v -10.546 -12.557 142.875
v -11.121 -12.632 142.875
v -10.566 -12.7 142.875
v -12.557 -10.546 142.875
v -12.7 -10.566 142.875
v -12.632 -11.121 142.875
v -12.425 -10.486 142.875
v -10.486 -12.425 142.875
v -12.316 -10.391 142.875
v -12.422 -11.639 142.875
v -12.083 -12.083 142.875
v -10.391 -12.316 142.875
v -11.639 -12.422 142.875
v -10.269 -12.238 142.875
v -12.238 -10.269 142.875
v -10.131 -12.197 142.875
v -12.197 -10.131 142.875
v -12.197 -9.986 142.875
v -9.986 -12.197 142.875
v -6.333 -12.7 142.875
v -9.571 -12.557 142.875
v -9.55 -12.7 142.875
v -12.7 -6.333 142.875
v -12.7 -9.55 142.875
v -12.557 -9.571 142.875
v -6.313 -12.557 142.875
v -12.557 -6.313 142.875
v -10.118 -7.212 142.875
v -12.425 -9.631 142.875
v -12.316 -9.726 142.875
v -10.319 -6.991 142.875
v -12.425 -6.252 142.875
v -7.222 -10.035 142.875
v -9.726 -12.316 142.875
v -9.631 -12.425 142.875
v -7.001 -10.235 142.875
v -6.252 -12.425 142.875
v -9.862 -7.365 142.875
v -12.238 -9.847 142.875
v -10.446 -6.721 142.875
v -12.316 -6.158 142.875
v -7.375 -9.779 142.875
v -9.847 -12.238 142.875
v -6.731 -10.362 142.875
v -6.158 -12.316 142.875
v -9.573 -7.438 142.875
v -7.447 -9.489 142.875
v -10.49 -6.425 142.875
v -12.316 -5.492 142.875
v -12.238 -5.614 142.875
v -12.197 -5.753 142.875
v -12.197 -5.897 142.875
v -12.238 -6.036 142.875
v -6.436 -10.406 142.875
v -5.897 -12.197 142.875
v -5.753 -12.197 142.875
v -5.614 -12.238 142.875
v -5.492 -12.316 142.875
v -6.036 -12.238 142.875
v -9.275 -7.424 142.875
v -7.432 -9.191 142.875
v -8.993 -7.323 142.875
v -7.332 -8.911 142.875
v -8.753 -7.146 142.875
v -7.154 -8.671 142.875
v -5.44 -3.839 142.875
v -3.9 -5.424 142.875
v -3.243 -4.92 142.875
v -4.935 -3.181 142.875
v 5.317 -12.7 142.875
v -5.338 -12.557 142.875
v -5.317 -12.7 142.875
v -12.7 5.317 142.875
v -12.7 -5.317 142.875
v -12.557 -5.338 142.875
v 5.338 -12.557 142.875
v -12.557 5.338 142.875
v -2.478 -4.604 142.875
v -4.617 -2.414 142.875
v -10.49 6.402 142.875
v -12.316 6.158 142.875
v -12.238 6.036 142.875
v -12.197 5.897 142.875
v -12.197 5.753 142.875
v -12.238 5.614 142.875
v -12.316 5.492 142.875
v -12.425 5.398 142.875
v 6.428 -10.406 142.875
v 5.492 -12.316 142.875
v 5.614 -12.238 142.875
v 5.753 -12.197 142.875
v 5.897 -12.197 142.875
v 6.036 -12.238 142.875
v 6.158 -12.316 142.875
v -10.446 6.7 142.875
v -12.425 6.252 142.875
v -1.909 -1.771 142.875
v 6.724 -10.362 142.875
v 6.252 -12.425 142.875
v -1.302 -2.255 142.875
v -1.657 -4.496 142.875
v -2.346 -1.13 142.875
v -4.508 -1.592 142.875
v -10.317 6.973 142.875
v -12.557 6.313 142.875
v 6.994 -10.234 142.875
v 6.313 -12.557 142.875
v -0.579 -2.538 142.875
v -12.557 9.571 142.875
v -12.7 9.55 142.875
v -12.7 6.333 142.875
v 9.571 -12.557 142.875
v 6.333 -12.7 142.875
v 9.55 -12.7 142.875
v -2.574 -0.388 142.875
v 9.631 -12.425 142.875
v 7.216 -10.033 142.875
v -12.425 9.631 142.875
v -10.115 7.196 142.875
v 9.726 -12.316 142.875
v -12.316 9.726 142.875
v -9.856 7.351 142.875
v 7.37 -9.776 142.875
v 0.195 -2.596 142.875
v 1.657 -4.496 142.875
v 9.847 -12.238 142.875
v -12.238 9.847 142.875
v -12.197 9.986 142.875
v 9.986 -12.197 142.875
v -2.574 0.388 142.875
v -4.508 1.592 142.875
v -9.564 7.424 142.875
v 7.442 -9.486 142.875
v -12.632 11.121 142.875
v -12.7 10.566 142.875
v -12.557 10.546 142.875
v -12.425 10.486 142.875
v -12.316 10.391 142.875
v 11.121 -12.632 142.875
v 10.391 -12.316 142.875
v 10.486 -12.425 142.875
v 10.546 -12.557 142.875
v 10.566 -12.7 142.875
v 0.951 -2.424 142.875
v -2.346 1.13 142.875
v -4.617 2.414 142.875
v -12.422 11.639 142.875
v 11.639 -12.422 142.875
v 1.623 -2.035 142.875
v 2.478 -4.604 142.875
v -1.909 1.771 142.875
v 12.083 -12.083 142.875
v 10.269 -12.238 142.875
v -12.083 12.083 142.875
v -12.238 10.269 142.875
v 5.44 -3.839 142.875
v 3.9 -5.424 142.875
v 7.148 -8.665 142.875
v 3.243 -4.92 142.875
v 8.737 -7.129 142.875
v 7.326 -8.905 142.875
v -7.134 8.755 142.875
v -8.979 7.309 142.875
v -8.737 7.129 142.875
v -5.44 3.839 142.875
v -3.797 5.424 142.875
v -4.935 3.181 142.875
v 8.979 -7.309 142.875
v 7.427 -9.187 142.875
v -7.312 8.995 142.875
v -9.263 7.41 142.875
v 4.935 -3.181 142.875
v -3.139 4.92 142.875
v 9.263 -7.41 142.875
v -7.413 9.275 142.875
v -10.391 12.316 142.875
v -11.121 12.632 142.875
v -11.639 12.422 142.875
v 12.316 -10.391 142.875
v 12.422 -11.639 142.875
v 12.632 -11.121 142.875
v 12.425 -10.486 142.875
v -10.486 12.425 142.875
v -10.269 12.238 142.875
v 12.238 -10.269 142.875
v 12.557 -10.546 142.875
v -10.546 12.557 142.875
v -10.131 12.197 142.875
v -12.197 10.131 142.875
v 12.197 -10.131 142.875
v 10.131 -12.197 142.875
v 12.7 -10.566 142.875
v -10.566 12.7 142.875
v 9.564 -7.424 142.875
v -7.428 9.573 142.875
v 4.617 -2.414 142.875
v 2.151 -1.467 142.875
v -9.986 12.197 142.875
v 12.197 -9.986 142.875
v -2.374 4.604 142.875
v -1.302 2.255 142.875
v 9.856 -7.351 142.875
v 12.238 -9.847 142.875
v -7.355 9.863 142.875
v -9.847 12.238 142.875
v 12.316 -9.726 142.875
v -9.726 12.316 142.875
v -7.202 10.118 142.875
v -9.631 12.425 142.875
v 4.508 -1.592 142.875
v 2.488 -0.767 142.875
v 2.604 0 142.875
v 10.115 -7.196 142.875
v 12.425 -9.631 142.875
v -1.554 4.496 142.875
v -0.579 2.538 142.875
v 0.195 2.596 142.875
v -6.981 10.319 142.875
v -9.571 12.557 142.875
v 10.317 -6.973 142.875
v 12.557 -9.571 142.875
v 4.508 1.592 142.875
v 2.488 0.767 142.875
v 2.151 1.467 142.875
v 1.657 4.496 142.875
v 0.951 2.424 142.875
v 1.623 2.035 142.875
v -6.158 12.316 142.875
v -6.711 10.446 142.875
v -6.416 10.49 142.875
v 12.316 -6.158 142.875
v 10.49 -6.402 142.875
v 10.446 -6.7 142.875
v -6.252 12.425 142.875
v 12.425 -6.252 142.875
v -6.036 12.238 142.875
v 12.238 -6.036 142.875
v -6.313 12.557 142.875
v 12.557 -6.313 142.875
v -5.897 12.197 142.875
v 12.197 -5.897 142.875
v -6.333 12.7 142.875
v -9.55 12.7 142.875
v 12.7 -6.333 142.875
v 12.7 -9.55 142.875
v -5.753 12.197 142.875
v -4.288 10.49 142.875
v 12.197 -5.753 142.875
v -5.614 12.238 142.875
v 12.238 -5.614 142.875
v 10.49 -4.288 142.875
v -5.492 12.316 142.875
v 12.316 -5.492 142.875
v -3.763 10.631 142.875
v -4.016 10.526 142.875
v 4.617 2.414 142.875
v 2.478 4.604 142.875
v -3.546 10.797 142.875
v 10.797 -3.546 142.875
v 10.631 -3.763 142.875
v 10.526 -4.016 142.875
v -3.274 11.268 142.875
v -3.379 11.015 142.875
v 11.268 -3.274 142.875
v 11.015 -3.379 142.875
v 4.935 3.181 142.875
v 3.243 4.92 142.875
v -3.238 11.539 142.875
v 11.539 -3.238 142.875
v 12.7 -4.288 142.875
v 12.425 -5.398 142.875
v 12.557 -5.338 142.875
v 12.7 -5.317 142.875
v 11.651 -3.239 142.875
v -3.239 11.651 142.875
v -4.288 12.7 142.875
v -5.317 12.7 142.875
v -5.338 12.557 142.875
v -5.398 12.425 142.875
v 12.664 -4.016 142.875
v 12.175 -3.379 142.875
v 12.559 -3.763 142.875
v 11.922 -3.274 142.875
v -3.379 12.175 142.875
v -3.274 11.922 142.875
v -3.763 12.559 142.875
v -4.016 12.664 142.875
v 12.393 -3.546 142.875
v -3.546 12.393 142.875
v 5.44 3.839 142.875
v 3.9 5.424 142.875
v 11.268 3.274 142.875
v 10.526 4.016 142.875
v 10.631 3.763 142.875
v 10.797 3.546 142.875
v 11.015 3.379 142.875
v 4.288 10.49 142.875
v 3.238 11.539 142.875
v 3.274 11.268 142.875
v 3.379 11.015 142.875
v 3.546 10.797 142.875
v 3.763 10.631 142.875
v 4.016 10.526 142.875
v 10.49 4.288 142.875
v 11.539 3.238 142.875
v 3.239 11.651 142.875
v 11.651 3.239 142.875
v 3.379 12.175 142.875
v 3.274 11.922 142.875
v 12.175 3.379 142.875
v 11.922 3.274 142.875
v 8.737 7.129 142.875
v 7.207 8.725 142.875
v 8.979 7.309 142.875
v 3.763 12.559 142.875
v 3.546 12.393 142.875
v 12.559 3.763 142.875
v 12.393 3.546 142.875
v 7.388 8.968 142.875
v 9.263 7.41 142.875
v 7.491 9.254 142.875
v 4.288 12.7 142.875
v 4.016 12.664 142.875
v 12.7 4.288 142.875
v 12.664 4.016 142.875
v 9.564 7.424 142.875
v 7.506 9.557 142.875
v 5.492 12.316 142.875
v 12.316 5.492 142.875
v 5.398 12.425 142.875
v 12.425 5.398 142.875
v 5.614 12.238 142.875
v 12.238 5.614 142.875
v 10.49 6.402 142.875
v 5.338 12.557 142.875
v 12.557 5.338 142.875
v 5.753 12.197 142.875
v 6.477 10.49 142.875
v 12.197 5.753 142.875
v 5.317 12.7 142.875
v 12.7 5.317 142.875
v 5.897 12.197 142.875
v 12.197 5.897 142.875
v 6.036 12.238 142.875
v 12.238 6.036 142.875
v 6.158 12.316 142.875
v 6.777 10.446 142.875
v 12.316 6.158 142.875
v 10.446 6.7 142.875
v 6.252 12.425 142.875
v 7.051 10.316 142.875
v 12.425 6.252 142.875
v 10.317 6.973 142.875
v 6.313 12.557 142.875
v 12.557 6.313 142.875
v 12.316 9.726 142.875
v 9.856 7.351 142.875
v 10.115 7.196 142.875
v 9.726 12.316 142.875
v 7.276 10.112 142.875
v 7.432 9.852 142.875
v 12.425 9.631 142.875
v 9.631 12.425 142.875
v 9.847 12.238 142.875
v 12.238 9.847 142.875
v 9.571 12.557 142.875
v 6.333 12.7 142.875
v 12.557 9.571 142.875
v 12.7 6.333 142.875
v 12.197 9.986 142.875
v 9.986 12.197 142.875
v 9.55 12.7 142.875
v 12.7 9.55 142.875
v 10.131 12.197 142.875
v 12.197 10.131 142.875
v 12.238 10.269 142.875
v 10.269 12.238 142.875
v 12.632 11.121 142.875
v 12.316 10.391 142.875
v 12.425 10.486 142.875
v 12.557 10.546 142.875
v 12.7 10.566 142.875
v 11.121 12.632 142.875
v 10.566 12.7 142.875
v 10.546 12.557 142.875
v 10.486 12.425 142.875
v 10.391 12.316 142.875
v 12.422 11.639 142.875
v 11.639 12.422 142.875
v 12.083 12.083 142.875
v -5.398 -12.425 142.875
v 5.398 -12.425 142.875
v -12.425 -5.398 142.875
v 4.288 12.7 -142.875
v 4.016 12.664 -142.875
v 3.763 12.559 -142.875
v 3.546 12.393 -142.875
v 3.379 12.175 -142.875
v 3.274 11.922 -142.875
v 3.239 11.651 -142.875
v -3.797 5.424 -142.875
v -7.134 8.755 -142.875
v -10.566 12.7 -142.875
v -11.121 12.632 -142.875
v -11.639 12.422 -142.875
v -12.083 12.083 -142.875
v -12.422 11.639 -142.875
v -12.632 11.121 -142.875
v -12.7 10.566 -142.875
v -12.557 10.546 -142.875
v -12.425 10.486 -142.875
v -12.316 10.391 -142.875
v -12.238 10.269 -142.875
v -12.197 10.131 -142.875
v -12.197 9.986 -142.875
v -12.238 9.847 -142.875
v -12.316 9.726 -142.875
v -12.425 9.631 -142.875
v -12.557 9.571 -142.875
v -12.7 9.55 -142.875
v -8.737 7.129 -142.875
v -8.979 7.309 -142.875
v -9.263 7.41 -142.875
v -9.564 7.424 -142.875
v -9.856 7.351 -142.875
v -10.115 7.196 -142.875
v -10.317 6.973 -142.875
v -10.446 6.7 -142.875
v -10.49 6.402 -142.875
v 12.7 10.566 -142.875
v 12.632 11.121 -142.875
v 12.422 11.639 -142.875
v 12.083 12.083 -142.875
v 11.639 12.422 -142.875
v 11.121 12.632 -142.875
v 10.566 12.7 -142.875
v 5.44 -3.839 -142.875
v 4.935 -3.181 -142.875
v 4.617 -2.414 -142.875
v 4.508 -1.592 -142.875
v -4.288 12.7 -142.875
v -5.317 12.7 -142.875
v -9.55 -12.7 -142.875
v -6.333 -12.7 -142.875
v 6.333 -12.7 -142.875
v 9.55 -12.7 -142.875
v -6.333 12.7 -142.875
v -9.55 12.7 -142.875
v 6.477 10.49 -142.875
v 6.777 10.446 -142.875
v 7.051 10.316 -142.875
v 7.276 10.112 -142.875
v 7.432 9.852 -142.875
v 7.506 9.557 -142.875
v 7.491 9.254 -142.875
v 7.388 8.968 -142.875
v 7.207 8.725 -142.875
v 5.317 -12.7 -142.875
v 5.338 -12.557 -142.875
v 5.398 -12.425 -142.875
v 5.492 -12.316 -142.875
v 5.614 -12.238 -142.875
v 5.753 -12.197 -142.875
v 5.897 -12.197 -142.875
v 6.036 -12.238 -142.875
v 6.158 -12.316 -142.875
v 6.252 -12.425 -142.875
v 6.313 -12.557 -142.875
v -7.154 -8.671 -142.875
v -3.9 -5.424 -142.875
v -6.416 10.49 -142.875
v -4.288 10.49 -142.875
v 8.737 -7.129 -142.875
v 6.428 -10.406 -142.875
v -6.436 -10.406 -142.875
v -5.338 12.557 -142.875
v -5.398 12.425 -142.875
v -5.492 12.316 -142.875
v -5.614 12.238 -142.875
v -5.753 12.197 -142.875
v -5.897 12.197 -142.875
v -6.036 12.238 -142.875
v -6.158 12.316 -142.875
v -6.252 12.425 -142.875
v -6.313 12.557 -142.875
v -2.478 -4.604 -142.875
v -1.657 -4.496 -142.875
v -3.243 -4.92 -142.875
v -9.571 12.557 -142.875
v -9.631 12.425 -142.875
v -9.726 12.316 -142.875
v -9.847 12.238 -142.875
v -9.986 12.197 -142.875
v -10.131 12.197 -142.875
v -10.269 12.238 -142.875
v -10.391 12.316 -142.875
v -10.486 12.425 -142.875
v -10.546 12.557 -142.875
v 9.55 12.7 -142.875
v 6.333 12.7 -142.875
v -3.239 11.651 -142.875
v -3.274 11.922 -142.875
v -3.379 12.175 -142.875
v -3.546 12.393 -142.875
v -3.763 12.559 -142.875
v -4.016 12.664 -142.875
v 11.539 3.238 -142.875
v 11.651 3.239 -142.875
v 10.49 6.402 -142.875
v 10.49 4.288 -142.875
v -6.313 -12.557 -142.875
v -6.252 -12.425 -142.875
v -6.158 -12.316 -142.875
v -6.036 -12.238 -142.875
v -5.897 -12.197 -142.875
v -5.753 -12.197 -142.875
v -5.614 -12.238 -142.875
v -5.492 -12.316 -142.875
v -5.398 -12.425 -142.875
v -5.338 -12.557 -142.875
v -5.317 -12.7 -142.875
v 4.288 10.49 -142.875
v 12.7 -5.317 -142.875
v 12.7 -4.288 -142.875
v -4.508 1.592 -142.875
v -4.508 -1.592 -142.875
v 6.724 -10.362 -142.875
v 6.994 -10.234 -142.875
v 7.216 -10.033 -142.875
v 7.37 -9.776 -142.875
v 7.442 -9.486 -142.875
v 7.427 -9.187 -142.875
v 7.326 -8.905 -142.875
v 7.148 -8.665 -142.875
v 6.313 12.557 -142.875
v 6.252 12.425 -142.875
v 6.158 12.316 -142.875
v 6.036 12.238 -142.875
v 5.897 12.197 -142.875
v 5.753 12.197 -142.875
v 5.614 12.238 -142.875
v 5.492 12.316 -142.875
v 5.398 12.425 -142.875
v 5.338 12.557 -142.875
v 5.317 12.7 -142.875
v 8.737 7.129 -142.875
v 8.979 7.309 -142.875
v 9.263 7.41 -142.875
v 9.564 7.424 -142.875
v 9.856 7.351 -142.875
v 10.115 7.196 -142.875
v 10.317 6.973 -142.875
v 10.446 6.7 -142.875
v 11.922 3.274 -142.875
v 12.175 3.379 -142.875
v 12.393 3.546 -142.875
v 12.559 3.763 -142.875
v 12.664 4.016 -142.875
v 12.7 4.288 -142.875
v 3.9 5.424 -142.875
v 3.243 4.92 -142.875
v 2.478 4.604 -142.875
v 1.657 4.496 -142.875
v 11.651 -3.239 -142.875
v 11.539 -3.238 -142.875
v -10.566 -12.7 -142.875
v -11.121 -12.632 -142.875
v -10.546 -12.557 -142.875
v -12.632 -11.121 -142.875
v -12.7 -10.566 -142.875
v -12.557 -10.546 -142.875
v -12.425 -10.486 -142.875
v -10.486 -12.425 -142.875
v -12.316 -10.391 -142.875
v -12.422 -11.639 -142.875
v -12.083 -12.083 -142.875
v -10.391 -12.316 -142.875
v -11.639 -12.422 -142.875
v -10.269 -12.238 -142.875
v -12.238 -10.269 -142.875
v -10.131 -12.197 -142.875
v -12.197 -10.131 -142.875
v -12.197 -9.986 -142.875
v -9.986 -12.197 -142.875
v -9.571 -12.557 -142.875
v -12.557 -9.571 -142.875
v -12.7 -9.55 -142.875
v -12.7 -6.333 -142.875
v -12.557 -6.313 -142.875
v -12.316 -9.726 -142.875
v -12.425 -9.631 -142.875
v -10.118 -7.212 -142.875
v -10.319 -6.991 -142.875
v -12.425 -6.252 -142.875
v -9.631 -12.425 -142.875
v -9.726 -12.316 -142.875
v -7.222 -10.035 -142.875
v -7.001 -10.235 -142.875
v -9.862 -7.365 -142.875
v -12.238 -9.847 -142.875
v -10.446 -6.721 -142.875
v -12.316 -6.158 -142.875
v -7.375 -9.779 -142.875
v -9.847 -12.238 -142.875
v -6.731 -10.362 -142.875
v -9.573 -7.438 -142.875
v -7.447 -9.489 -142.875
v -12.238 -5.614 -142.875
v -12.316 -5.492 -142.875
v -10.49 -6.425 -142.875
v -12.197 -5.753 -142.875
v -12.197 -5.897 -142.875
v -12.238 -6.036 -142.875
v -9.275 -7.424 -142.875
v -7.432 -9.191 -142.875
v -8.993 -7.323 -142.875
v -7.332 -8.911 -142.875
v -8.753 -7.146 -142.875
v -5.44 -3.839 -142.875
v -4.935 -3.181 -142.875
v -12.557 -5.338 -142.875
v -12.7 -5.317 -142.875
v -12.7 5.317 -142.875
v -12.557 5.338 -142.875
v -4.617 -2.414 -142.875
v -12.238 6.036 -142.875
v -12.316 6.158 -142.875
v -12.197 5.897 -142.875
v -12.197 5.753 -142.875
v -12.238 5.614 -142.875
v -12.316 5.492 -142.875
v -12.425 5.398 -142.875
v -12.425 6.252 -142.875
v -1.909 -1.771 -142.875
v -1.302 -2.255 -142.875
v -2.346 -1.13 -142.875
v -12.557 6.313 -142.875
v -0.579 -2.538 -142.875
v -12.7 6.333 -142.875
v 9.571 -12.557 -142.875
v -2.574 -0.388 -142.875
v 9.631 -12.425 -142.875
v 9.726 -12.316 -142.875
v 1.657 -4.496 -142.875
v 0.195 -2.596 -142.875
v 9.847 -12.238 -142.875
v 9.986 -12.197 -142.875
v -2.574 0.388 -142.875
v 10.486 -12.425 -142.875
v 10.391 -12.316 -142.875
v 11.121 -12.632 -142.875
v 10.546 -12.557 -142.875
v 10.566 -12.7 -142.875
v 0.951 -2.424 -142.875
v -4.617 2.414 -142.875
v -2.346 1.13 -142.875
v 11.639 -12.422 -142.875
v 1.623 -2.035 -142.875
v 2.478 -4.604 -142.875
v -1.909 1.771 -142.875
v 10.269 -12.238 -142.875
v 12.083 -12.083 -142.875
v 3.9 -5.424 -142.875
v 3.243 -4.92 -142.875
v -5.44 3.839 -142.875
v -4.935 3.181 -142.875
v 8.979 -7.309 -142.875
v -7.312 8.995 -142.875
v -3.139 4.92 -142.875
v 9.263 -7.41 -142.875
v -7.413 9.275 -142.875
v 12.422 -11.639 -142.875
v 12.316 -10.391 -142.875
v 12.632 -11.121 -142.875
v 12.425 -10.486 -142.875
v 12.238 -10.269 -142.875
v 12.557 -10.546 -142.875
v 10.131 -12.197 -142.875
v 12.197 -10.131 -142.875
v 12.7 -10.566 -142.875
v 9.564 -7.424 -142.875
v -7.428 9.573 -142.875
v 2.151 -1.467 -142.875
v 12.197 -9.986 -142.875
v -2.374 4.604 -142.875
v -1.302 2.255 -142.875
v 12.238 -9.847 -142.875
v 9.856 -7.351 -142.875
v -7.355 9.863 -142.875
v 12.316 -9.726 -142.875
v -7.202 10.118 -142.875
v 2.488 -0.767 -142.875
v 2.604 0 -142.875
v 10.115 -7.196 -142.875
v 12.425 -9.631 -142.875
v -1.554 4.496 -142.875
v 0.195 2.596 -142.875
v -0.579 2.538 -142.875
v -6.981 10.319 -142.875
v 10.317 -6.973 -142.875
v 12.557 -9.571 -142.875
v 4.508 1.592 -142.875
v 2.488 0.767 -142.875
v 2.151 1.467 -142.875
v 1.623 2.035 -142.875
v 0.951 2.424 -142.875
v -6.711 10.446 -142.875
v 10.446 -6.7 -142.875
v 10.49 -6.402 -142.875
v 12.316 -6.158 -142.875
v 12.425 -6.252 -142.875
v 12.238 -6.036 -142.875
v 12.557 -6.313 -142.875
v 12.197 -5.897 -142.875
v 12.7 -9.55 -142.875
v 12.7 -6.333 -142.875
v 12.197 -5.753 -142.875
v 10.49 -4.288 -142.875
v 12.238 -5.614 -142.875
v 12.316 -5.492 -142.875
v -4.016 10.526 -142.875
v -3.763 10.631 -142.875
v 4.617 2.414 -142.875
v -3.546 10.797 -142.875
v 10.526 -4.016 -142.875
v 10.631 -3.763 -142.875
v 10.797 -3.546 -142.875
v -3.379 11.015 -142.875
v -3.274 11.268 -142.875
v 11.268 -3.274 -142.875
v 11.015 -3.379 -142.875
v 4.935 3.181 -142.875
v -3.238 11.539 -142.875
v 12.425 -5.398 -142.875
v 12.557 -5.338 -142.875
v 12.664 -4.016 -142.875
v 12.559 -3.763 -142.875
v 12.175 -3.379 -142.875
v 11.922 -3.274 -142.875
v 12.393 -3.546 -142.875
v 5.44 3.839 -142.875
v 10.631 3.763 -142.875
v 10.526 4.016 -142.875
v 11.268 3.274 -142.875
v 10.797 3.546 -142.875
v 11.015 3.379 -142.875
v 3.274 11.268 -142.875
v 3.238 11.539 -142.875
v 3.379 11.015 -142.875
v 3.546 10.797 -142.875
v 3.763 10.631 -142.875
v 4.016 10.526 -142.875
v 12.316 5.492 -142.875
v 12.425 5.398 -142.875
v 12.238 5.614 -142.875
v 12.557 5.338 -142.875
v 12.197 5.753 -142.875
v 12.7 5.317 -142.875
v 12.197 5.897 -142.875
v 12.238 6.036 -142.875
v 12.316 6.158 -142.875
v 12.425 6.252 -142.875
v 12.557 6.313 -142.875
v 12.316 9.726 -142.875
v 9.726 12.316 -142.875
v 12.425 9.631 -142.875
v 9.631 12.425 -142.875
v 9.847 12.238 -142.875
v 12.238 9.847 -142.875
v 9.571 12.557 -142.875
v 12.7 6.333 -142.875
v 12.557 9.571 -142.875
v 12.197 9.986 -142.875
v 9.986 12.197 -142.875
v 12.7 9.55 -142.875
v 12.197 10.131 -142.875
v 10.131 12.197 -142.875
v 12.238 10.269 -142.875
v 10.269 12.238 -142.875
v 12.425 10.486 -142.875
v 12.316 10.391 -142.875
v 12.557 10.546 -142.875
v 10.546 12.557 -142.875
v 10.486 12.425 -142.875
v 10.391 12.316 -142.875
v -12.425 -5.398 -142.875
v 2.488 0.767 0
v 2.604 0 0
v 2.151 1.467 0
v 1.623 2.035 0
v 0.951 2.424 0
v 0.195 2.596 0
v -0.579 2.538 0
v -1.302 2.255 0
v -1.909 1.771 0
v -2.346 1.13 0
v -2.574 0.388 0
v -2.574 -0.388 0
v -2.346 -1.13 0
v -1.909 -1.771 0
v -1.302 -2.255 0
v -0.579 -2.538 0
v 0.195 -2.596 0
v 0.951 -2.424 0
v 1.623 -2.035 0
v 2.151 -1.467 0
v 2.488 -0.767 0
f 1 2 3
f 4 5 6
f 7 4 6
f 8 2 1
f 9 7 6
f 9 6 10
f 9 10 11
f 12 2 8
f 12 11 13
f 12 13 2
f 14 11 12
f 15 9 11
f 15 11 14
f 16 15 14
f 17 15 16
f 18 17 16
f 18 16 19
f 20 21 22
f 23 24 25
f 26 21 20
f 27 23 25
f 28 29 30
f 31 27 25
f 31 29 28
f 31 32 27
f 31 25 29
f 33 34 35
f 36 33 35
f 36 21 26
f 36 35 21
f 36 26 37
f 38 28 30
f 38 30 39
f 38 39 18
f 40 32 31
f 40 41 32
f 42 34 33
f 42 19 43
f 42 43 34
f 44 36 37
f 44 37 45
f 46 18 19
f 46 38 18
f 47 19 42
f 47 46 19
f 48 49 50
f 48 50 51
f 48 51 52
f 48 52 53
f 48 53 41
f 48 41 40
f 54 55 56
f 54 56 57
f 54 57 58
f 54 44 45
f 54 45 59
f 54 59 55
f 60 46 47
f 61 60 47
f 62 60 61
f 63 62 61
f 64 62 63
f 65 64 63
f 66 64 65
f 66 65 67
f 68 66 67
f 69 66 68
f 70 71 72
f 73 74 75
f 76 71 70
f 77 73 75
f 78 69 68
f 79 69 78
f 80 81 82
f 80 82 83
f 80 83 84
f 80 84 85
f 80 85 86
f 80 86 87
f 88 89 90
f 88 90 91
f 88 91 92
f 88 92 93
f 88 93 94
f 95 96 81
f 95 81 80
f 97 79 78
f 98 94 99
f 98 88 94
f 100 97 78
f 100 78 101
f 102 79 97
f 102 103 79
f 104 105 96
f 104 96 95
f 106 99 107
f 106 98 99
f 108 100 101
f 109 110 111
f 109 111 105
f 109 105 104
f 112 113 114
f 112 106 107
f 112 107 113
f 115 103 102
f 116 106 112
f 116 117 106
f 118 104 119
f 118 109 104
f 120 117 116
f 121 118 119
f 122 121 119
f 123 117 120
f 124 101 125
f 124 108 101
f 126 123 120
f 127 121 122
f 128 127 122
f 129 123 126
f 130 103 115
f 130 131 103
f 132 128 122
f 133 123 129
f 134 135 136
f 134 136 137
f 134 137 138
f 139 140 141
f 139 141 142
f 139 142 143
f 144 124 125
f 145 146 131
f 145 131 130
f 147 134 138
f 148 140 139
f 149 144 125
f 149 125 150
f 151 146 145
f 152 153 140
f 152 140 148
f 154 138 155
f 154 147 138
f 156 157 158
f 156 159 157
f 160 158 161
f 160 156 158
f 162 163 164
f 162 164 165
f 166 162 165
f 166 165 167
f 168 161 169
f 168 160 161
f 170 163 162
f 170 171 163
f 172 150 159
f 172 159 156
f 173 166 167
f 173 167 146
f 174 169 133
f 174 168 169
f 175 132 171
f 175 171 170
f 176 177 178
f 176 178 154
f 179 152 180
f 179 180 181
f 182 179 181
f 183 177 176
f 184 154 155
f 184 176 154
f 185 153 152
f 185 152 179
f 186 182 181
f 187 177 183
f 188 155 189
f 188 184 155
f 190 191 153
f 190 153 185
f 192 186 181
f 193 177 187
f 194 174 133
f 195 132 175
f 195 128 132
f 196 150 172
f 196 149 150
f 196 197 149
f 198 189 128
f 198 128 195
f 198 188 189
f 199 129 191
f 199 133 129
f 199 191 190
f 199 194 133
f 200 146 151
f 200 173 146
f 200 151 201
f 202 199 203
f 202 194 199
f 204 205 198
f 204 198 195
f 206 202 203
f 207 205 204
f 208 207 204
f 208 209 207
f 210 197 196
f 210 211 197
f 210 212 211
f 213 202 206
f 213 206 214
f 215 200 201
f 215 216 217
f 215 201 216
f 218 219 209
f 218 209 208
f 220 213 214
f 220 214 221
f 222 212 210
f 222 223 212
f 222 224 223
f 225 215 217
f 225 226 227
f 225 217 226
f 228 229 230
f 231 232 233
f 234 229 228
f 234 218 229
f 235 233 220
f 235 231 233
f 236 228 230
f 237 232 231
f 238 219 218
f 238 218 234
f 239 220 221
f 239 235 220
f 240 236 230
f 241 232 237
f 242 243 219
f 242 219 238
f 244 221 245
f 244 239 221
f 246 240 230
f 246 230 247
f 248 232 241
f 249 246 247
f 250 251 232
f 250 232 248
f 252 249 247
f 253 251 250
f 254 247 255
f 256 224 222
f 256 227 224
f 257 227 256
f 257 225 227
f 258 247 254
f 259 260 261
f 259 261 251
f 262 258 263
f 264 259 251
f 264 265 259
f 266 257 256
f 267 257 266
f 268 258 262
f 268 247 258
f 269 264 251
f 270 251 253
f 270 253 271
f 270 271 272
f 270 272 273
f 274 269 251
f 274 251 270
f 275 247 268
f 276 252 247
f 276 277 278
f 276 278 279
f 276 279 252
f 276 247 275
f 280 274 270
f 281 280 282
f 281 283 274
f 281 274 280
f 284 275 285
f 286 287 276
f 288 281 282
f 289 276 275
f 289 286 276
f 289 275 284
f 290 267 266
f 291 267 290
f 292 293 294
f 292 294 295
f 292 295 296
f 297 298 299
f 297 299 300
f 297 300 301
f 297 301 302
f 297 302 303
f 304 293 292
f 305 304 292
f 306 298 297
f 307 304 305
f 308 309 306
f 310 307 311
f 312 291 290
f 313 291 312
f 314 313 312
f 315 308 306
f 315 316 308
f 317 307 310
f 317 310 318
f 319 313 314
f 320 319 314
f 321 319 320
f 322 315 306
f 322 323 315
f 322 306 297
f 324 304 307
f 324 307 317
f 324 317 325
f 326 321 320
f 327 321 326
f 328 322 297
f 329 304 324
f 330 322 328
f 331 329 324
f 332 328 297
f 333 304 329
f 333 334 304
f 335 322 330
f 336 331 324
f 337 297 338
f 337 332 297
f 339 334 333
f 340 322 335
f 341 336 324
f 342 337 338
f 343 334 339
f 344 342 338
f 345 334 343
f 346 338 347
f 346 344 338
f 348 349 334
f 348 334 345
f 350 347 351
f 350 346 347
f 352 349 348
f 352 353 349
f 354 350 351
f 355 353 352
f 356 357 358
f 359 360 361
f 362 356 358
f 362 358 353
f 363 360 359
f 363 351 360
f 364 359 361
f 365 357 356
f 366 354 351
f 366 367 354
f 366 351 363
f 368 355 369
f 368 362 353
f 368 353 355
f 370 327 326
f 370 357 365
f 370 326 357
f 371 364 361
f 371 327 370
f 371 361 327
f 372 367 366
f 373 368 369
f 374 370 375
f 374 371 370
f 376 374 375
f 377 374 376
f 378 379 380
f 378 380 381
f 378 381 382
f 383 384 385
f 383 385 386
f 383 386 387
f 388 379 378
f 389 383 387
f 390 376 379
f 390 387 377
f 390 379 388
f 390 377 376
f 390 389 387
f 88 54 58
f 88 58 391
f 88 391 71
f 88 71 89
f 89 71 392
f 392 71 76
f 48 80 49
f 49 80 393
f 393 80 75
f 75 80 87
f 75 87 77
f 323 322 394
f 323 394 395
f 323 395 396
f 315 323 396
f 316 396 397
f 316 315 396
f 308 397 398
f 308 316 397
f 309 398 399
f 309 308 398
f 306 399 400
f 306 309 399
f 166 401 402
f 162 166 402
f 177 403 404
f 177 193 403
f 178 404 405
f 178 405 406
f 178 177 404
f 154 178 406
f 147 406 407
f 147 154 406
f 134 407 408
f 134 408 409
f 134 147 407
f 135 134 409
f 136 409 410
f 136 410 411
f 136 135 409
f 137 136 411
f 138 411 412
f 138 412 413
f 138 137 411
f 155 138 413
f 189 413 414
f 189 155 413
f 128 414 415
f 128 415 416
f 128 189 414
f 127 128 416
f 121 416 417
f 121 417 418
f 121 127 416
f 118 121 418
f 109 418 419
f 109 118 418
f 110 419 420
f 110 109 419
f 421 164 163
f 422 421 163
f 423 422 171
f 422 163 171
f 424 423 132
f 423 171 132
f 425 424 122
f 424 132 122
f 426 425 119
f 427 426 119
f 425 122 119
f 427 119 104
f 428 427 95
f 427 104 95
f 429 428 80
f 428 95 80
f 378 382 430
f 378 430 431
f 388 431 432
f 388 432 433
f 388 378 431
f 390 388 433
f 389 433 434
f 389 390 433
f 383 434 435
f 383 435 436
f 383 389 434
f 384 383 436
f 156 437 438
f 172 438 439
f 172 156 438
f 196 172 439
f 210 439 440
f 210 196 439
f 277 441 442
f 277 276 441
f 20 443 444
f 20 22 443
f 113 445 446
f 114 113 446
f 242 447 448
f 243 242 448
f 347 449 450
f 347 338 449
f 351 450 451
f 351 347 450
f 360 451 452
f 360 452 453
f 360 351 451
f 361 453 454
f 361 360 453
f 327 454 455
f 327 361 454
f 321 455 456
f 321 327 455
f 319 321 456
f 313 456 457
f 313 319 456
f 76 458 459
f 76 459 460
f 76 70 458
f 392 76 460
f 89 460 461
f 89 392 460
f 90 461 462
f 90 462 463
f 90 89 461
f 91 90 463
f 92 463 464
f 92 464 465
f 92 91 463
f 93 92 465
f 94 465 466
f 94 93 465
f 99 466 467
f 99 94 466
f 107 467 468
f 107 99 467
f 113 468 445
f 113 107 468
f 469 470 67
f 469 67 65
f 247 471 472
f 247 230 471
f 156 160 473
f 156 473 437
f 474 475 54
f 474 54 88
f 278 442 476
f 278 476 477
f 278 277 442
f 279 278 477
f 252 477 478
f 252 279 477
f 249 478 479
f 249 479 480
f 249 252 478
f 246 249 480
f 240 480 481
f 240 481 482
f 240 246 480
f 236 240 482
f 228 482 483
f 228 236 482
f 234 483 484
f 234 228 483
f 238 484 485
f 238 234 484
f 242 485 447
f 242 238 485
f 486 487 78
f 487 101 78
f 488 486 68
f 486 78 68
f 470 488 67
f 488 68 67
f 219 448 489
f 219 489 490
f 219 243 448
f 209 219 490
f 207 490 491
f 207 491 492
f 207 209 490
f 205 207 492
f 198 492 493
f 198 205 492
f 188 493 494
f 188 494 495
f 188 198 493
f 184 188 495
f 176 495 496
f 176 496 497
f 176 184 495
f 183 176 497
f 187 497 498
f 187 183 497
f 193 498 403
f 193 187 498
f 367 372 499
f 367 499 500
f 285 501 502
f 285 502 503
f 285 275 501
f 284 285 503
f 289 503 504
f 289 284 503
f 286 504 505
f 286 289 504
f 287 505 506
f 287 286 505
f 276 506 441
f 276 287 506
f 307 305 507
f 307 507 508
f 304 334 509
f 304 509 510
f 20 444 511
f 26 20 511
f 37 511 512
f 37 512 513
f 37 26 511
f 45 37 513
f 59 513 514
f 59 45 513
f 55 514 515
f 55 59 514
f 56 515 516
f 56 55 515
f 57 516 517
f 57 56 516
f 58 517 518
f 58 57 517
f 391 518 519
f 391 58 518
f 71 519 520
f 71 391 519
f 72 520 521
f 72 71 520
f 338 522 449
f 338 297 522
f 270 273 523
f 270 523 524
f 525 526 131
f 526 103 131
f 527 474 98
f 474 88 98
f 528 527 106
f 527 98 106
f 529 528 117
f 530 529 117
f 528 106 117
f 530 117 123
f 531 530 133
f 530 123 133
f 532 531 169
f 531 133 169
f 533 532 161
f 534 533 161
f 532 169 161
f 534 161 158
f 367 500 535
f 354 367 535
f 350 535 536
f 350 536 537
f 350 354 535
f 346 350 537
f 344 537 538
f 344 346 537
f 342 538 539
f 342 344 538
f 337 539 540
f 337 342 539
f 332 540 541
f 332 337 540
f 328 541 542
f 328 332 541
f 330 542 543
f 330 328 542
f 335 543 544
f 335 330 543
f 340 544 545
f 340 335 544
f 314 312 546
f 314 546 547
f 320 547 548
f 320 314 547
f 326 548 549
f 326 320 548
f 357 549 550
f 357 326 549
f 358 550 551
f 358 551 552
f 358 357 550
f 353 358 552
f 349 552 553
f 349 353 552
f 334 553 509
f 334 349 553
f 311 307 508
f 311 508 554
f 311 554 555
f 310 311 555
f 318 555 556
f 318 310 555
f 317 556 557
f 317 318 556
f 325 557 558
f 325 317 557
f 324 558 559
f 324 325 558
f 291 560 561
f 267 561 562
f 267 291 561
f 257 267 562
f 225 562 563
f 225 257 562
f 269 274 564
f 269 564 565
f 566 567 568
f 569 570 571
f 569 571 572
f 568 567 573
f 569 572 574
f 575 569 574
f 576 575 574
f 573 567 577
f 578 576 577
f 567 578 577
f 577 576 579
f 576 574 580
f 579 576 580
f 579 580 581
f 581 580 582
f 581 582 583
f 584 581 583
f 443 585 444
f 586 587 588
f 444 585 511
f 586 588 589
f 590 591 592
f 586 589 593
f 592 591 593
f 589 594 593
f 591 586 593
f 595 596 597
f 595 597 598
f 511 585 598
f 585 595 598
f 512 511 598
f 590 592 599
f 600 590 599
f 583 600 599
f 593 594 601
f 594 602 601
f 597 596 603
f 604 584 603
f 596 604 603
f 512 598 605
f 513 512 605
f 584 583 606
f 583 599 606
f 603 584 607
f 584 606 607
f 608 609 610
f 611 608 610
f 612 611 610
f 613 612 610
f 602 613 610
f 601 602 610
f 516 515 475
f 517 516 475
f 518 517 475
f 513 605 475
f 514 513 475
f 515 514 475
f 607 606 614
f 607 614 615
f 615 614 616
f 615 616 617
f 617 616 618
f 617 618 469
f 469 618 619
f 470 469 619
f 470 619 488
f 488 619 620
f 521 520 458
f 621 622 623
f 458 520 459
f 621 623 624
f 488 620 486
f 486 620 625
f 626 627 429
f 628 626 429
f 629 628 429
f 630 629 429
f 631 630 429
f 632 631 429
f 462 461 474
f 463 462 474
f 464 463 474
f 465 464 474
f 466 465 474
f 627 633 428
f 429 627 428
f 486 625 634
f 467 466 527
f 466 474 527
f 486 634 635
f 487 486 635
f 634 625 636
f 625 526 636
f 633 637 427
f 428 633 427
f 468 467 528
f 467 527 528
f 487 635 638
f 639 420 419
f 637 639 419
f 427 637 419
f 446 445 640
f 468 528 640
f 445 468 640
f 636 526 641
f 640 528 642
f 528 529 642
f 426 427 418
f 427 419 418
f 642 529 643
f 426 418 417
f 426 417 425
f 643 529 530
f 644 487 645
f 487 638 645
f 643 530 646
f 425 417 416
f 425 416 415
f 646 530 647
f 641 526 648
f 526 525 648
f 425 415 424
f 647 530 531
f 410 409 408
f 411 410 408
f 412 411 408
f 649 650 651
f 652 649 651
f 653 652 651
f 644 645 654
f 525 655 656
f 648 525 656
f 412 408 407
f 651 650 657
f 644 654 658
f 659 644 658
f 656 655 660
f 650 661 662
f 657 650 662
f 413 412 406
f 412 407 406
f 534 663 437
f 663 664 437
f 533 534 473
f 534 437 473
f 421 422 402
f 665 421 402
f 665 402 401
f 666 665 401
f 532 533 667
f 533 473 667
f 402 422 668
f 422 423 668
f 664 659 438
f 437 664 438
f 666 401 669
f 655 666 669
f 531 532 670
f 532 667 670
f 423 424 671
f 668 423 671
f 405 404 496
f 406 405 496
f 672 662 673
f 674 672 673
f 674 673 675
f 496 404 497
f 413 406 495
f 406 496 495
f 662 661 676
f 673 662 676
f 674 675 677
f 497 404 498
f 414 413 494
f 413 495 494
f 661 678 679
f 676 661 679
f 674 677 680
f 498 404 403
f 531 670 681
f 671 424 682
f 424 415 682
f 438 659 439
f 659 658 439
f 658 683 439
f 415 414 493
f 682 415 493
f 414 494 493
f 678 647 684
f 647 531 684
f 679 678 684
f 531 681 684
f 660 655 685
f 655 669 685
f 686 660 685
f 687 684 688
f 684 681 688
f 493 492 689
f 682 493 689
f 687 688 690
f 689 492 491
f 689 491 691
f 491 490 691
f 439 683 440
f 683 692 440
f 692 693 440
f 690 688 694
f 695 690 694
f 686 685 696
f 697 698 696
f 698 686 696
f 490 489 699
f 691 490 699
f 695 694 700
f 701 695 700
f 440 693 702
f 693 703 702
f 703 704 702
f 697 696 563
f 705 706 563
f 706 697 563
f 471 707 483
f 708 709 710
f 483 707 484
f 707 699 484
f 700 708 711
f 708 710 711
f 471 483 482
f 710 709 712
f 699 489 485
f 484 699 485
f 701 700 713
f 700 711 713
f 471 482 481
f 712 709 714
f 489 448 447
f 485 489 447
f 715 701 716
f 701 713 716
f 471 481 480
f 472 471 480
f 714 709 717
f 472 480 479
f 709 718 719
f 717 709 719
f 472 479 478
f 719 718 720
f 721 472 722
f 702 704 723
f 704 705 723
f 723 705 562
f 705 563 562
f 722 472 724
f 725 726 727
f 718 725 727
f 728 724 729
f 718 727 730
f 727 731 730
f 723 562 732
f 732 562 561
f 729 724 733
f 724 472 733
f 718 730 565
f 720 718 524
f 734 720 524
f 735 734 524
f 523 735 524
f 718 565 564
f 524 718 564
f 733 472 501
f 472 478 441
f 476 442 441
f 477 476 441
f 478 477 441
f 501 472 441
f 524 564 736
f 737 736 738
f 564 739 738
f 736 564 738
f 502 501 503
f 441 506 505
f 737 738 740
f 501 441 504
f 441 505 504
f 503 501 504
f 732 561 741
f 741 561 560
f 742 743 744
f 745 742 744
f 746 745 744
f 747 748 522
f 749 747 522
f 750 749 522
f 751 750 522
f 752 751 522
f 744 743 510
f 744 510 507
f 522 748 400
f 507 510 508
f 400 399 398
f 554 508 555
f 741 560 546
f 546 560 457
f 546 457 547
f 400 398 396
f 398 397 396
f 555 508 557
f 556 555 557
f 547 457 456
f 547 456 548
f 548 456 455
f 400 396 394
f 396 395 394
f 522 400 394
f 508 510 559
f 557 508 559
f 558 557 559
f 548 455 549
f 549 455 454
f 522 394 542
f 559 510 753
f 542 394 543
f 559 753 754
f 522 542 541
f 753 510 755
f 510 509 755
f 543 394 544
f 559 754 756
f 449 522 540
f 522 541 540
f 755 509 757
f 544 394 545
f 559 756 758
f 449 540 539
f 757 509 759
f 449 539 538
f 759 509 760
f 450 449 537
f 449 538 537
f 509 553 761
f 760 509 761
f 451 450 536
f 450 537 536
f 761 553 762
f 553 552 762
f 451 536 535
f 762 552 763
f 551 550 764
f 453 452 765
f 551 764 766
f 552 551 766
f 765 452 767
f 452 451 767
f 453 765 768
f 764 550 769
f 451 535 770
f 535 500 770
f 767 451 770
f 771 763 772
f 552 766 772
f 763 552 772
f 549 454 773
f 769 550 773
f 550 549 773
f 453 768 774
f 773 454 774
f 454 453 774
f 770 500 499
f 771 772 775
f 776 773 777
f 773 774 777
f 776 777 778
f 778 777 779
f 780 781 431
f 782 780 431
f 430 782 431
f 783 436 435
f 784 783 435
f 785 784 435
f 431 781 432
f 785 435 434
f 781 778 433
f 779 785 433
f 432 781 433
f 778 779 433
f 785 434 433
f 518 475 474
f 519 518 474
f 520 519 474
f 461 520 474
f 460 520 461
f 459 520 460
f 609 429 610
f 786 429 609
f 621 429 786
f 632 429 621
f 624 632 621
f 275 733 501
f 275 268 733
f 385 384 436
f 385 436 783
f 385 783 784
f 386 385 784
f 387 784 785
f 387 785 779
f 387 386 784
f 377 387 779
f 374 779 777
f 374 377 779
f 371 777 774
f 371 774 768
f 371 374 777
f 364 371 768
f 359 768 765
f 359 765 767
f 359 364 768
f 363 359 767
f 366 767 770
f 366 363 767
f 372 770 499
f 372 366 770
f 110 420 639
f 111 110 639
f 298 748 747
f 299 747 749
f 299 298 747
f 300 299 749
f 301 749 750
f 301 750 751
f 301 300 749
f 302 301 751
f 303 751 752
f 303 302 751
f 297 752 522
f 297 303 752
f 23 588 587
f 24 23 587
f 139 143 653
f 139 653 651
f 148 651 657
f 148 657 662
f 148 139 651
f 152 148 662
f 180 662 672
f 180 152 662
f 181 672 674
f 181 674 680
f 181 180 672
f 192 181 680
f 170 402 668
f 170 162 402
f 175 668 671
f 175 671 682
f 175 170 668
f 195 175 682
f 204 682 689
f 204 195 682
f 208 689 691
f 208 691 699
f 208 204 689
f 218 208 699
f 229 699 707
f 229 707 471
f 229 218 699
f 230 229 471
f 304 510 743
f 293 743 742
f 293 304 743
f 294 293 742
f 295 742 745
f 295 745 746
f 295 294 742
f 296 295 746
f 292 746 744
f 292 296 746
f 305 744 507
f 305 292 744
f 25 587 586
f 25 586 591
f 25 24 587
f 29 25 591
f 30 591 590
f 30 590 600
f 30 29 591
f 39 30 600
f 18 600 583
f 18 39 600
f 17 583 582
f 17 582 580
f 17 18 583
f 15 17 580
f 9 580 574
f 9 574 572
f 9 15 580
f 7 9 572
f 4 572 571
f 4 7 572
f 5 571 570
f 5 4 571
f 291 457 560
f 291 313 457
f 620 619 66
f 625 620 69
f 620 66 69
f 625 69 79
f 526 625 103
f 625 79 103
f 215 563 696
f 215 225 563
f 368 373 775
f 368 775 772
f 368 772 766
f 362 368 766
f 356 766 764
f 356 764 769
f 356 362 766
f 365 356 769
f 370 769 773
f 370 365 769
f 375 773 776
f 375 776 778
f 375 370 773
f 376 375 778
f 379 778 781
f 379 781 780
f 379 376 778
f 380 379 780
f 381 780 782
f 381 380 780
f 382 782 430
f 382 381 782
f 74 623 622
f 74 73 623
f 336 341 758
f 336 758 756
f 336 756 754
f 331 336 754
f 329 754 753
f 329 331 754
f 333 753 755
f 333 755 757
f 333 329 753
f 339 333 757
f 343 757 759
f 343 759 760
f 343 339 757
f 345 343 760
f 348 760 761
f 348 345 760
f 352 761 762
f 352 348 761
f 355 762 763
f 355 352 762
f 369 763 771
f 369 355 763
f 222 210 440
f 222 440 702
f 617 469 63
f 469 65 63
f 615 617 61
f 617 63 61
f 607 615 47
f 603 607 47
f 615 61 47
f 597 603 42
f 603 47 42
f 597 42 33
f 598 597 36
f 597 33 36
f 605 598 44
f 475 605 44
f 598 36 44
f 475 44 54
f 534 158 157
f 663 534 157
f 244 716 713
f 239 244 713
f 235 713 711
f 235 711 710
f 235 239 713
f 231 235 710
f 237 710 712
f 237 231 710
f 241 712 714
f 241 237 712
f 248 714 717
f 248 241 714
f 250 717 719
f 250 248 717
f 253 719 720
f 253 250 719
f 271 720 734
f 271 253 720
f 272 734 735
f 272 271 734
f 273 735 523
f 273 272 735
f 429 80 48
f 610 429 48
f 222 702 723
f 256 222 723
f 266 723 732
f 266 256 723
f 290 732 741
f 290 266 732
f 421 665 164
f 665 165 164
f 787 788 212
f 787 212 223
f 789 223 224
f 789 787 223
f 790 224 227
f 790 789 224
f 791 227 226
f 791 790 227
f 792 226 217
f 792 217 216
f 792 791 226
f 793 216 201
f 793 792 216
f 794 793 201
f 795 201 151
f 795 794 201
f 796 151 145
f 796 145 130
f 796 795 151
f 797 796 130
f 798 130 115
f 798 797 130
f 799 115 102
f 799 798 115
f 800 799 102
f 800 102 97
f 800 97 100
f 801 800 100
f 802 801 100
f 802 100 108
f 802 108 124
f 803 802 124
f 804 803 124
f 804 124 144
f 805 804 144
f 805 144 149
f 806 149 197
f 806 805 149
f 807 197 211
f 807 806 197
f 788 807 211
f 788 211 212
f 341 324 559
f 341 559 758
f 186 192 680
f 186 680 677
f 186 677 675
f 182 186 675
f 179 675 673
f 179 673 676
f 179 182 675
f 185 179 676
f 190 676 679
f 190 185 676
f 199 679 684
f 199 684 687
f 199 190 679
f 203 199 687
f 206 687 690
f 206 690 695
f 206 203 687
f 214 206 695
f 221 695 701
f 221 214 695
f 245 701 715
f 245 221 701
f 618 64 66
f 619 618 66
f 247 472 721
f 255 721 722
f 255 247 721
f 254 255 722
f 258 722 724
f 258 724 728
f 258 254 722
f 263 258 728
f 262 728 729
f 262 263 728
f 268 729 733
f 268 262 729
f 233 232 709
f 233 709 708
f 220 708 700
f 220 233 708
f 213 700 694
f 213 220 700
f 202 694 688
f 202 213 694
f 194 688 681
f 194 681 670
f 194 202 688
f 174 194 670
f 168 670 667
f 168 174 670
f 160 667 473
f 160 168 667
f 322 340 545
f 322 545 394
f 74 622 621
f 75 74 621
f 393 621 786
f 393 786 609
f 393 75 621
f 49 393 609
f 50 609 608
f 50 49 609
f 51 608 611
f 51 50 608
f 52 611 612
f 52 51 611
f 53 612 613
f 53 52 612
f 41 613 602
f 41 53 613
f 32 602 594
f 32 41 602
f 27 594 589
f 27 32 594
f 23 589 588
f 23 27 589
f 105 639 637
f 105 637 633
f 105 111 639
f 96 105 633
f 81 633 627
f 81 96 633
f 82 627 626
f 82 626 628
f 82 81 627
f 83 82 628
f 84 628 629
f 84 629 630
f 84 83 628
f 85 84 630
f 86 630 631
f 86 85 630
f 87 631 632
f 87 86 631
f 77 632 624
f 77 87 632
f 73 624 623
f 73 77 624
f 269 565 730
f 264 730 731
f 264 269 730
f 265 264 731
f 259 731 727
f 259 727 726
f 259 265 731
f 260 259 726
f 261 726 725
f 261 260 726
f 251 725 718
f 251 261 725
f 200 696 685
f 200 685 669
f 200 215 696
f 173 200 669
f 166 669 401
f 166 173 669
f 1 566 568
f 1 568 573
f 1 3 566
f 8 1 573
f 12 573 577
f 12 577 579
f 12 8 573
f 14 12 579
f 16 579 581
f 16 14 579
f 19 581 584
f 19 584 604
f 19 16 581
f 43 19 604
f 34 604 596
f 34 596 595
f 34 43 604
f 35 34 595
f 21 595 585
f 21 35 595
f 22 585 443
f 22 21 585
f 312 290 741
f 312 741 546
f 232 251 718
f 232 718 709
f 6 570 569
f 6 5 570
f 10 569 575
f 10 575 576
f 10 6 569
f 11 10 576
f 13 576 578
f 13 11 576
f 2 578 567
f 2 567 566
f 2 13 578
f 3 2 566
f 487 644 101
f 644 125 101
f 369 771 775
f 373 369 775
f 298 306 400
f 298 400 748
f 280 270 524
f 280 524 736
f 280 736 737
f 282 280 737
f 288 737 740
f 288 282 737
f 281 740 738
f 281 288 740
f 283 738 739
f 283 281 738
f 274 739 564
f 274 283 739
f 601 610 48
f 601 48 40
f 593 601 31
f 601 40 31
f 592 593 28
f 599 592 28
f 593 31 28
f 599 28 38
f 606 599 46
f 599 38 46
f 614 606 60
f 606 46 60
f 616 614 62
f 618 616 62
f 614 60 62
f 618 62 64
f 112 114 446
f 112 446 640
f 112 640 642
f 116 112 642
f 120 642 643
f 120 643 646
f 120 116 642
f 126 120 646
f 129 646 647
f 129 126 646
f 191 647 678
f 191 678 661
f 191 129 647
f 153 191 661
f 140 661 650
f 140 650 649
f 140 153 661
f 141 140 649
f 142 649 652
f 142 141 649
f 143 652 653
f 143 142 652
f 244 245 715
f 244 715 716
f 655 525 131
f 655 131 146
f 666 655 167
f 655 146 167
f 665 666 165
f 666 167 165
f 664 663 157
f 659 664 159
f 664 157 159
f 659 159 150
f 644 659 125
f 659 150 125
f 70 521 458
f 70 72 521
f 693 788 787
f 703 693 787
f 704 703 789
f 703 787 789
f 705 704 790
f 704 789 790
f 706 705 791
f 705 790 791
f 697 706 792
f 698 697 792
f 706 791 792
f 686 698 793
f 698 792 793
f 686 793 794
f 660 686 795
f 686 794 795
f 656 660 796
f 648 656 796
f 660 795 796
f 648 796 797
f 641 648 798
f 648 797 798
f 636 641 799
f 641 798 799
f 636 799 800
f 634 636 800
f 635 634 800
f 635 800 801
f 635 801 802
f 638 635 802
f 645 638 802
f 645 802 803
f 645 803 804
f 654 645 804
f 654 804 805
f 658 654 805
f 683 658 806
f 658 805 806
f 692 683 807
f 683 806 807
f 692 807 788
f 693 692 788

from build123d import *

# Parameters (mm, degrees)
SKETCH3_R                = 2.6035
BOSS_EXTRUDE1_DEPTH      = 142.875
BOSS_EXTRUDE1_DEPTH_BACK = 142.875


with BuildPart() as part:
    # Sketch3 → Boss-Extrude1 (new body, two sides)
    with BuildSketch(Plane.XY) as boss_extrude1_sk:
        with BuildLine():
            Line((6.3331344, -12.7), (9.5504, -12.7))
            ThreePointArc((9.5504, -12.7), (10.058323491, -12.192000006), (10.566399977, -12.699846982))
            ThreePointArc((10.566399977, -12.699846982), (12.082522516, -12.082522516), (12.699846982, -10.566399977))
            ThreePointArc((12.699846982, -10.566399977), (12.192000006, -10.058323491), (12.7, -9.5504))
            Line((12.7, -9.5504), (12.7, -6.3330836))
            ThreePointArc((12.7, -6.3330836), (12.192, -5.8250836), (12.7, -5.3170836))
            Line((12.7, -5.3170836), (12.7, -4.28752))
            ThreePointArc((12.7, -4.28752), (12.392749156, -3.545750844), (11.65098, -3.2385))
            Line((11.65098, -3.2385), (11.53922, -3.2385))
            ThreePointArc((11.53922, -3.2385), (10.797450844, -3.545750844), (10.4902, -4.28752))
            Line((10.4902, -4.28752), (10.4902, -6.402089023))
            ThreePointArc((10.4902, -6.402089023), (9.856394933, -7.351113629), (8.736962546, -7.129240479))
            Line((8.736962546, -7.129240479), (5.440484187, -3.838768792))
            ThreePointArc((5.440484187, -3.838768792), (4.75073678, -2.808015636), (4.5085, -1.591658411))
            Line((4.5085, -1.591658411), (4.5085, 1.591658411))
            ThreePointArc((4.5085, 1.591658411), (4.75073678, 2.808015636), (5.440484187, 3.838768792))
            Line((5.440484187, 3.838768792), (8.736962546, 7.129240479))
            ThreePointArc((8.736962546, 7.129240479), (9.856394933, 7.351113629), (10.4902, 6.402089023))
            Line((10.4902, 6.402089023), (10.4902, 4.28752))
            ThreePointArc((10.4902, 4.28752), (10.797450844, 3.545750844), (11.53922, 3.2385))
            Line((11.53922, 3.2385), (11.65098, 3.2385))
            ThreePointArc((11.65098, 3.2385), (12.392749156, 3.545750844), (12.7, 4.28752))
            Line((12.7, 4.28752), (12.7, 5.3171344))
            ThreePointArc((12.7, 5.3171344), (12.192, 5.8251344), (12.7, 6.3331344))
            Line((12.7, 6.3331344), (12.7, 9.5504))
            ThreePointArc((12.7, 9.5504), (12.192000006, 10.058323491), (12.699846982, 10.566399977))
            ThreePointArc((12.699846982, 10.566399977), (12.082522516, 12.082522516), (10.566399977, 12.699846982))
            ThreePointArc((10.566399977, 12.699846982), (10.058323491, 12.192000006), (9.5504, 12.7))
            Line((9.5504, 12.7), (6.3330836, 12.7))
            ThreePointArc((6.3330836, 12.7), (5.8250836, 12.192), (5.3170836, 12.7))
            Line((5.3170836, 12.7), (4.28752, 12.7))
            ThreePointArc((4.28752, 12.7), (3.545750844, 12.392749156), (3.2385, 11.65098))
            Line((3.2385, 11.65098), (3.2385, 11.53922))
            ThreePointArc((3.2385, 11.53922), (3.545750844, 10.797450844), (4.28752, 10.4902))
            Line((4.28752, 10.4902), (6.476795923, 10.4902))
            ThreePointArc((6.476795923, 10.4902), (7.432175542, 9.851520654), (7.207206853, 8.724555432))
            Line((7.207206853, 8.724555432), (3.900315394, 5.423689619))
            ThreePointArc((3.900315394, 5.423689619), (2.8709819, 4.736928798), (1.657299581, 4.4958))
            Line((1.657299581, 4.4958), (-1.553667902, 4.4958))
            ThreePointArc((-1.553667902, 4.4958), (-2.767350221, 4.736928798), (-3.796683715, 5.423689619))
            Line((-3.796683715, 5.423689619), (-7.134200223, 8.755124678))
            ThreePointArc((-7.134200223, 8.755124678), (-7.355273948, 9.862578342), (-6.416435163, 10.4902))
            Line((-6.416435163, 10.4902), (-4.28752, 10.4902))
            ThreePointArc((-4.28752, 10.4902), (-3.545750844, 10.797450844), (-3.2385, 11.53922))
            Line((-3.2385, 11.53922), (-3.2385, 11.65098))
            ThreePointArc((-3.2385, 11.65098), (-3.545750844, 12.392749156), (-4.28752, 12.7))
            Line((-4.28752, 12.7), (-5.3171344, 12.7))
            ThreePointArc((-5.3171344, 12.7), (-5.8251344, 12.192), (-6.3331344, 12.7))
            Line((-6.3331344, 12.7), (-9.5504, 12.7))
            ThreePointArc((-9.5504, 12.7), (-10.058323491, 12.192000006), (-10.566399977, 12.699846982))
            ThreePointArc((-10.566399977, 12.699846982), (-12.082522516, 12.082522516), (-12.699846982, 10.566399977))
            ThreePointArc((-12.699846982, 10.566399977), (-12.192000006, 10.058323491), (-12.7, 9.5504))
            Line((-12.7, 9.5504), (-12.7, 6.3331344))
            ThreePointArc((-12.7, 6.3331344), (-12.192, 5.8251344), (-12.7, 5.3171344))
            Line((-12.7, 5.3171344), (-12.7, -5.3170836))
            ThreePointArc((-12.7, -5.3170836), (-12.192, -5.8250836), (-12.7, -6.3330836))
            Line((-12.7, -6.3330836), (-12.7, -9.5504))
            ThreePointArc((-12.7, -9.5504), (-12.192000006, -10.058323491), (-12.699846982, -10.566399977))
            ThreePointArc((-12.699846982, -10.566399977), (-12.082522516, -12.082522516), (-10.566399977, -12.699846982))
            ThreePointArc((-10.566399977, -12.699846982), (-10.058323491, -12.192000006), (-9.5504, -12.7))
            Line((-9.5504, -12.7), (-6.3330836, -12.7))
            ThreePointArc((-6.3330836, -12.7), (-5.8250836, -12.192), (-5.3170836, -12.7))
            Line((-5.3170836, -12.7), (5.3171344, -12.7))
            ThreePointArc((5.3171344, -12.7), (5.8251344, -12.192), (6.3331344, -12.7))
        make_face()
        Circle(SKETCH3_R, mode=Mode.SUBTRACT)
        with BuildLine():
            Line((-8.753441447, -7.145689354), (-5.440484187, -3.838768792))
            ThreePointArc((-5.440484187, -3.838768792), (-4.75073678, -2.808015636), (-4.5085, -1.591658411))
            Line((-4.5085, -1.591658411), (-4.5085, 1.591658411))
            ThreePointArc((-4.5085, 1.591658411), (-4.75073678, 2.808015636), (-5.440484187, 3.838768792))
            Line((-5.440484187, 3.838768792), (-8.736962546, 7.129240479))
            ThreePointArc((-8.736962546, 7.129240479), (-9.856394933, 7.351113629), (-10.4902, 6.402089023))
            Line((-10.4902, 6.402089023), (-10.4902, -6.425372487))
            ThreePointArc((-10.4902, -6.425372487), (-9.862352148, -7.36547709), (-8.753441447, -7.145689354))
        make_face(mode=Mode.SUBTRACT)
        with BuildLine():
            Line((7.147805753, -8.66526257), (3.900315394, -5.423689619))
            ThreePointArc((3.900315394, -5.423689619), (2.8709819, -4.736928798), (1.657299581, -4.4958))
            Line((1.657299581, -4.4958), (-1.657299581, -4.4958))
            ThreePointArc((-1.657299581, -4.4958), (-2.8709819, -4.736928798), (-3.900315394, -5.423689619))
            Line((-3.900315394, -5.423689619), (-7.153722341, -8.671168377))
            ThreePointArc((-7.153722341, -8.671168377), (-7.374796065, -9.77862204), (-6.435957281, -10.406243698))
            Line((-6.435957281, -10.406243698), (6.427597582, -10.406243698))
            ThreePointArc((6.427597582, -10.406243698), (7.369631963, -9.776485757), (7.147805753, -8.66526257))
        make_face(mode=Mode.SUBTRACT)
    extrude(amount=BOSS_EXTRUDE1_DEPTH)
    extrude(boss_extrude1_sk.sketch, amount=-BOSS_EXTRUDE1_DEPTH_BACK)


solid = part.part
